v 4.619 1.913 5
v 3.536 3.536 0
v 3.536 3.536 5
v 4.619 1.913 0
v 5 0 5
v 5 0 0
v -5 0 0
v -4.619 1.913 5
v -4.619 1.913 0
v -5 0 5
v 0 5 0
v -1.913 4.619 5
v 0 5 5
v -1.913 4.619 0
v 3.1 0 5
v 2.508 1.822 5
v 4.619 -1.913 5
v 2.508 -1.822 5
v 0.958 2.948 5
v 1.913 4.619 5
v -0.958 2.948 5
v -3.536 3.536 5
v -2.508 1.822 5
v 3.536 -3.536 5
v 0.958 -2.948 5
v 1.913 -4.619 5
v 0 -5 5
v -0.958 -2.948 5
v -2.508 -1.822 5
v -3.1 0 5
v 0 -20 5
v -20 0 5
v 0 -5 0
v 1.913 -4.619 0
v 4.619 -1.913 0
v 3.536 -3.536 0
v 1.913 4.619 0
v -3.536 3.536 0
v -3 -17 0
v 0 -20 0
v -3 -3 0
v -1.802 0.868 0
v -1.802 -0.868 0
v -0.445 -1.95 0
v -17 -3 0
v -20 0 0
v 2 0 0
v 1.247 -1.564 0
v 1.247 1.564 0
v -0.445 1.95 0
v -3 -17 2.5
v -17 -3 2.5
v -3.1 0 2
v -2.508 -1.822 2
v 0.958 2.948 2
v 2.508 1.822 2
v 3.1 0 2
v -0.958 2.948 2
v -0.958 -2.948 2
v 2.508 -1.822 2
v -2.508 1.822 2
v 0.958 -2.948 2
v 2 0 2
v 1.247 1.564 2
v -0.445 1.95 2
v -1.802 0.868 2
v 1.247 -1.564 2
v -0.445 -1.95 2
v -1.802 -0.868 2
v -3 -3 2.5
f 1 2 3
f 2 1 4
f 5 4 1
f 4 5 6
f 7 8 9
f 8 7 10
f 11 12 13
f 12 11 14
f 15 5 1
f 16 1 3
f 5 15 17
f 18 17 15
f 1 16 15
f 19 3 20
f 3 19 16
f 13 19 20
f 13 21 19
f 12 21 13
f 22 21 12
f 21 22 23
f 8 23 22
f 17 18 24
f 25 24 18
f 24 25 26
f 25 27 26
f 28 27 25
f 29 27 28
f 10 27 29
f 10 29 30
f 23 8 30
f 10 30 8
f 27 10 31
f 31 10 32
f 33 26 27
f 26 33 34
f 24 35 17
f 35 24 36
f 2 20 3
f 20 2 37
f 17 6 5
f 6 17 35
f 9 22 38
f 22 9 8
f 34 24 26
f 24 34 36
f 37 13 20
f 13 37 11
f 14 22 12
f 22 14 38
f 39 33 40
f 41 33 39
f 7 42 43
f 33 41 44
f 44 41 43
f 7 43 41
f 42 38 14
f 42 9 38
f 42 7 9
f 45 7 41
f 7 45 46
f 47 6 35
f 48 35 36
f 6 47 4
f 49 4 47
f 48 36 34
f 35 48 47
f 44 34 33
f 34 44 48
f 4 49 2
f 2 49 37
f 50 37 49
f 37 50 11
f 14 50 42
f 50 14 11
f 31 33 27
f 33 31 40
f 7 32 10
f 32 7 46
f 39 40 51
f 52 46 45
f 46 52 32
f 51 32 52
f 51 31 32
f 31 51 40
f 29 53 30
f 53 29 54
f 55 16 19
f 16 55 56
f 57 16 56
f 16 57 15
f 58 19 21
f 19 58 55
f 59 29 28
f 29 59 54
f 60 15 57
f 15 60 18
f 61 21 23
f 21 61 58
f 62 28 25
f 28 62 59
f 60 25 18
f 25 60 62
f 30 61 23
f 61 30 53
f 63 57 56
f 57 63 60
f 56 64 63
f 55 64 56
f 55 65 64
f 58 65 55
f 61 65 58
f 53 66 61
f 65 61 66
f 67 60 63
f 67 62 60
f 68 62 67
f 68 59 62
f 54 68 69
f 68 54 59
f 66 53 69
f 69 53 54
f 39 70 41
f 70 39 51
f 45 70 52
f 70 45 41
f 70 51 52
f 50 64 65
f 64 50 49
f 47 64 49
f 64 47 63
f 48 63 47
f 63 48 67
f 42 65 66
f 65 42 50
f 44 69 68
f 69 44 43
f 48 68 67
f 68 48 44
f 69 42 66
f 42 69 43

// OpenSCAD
// Width of triangle edges
triangle_width = 20;
// Height of triangle
triangle_height = 5;

// Height of inner triangle difference
tri_offset_height = 2.5;
// Edge of inner triangle difference
tri_offset_width = 17;

// Outer circle radius
circle_radius = 5;
// Screw hole width
screw_hole_width = 2;

// Screwhead diameter
screwhead_diameter = 6.2;
// Screwhead height
screwhead_height = 3;

tri_offset_x = (triangle_width - tri_offset_width);
tri_offset_y = (triangle_width - tri_offset_width);


render (convexity = 1) {
   create_part();
}

module create_part() {

difference() {
  union() {
	cylinder(h = triangle_height, r = circle_radius, center = false);

  	polyhedron(
		points = [
			[0, 0, 0], [0, 0, triangle_height],
			[0, - triangle_width, 0], [0, - triangle_width, triangle_height],
			[- triangle_width, 0, 0], [- triangle_width, 0, triangle_height],
			], 
		triangles = [
			[1,0,2], [1,2,3],
			[0,1,4], [1,5,4],
			[0,4,2], [1,3,5],
			[4,5,3], [3,2,4]
		]
	);
  }
  translate(v=[0, 0, triangle_height-screwhead_height]) {
	cylinder(h = screwhead_height, r = screwhead_diameter/2, center = false);
  }

  polyhedron(
	points = [
		[ - tri_offset_x, - tri_offset_y, -.01], [- tri_offset_x, -tri_offset_y , tri_offset_height],
		[- tri_offset_x, - triangle_width + tri_offset_y - .01, -.01], [- tri_offset_x, - triangle_width - tri_offset_y + .01, tri_offset_height],
		[- triangle_width + tri_offset_x - .01, -tri_offset_y, -.01], [- triangle_width + tri_offset_x - .01, - tri_offset_y, tri_offset_height],
		], 
	triangles = [
		[1,0,2], [1,2,3],
		[0,1,4], [1,5,4],
		[0,4,2], [1,3,5],
		[4,5,3], [3,2,4]
	]
  );
  translate(v = [0, 0, -0.01]) {
  	cylinder(h = triangle_height + 0.02, r = screw_hole_width, center = false);
  }
}

}
